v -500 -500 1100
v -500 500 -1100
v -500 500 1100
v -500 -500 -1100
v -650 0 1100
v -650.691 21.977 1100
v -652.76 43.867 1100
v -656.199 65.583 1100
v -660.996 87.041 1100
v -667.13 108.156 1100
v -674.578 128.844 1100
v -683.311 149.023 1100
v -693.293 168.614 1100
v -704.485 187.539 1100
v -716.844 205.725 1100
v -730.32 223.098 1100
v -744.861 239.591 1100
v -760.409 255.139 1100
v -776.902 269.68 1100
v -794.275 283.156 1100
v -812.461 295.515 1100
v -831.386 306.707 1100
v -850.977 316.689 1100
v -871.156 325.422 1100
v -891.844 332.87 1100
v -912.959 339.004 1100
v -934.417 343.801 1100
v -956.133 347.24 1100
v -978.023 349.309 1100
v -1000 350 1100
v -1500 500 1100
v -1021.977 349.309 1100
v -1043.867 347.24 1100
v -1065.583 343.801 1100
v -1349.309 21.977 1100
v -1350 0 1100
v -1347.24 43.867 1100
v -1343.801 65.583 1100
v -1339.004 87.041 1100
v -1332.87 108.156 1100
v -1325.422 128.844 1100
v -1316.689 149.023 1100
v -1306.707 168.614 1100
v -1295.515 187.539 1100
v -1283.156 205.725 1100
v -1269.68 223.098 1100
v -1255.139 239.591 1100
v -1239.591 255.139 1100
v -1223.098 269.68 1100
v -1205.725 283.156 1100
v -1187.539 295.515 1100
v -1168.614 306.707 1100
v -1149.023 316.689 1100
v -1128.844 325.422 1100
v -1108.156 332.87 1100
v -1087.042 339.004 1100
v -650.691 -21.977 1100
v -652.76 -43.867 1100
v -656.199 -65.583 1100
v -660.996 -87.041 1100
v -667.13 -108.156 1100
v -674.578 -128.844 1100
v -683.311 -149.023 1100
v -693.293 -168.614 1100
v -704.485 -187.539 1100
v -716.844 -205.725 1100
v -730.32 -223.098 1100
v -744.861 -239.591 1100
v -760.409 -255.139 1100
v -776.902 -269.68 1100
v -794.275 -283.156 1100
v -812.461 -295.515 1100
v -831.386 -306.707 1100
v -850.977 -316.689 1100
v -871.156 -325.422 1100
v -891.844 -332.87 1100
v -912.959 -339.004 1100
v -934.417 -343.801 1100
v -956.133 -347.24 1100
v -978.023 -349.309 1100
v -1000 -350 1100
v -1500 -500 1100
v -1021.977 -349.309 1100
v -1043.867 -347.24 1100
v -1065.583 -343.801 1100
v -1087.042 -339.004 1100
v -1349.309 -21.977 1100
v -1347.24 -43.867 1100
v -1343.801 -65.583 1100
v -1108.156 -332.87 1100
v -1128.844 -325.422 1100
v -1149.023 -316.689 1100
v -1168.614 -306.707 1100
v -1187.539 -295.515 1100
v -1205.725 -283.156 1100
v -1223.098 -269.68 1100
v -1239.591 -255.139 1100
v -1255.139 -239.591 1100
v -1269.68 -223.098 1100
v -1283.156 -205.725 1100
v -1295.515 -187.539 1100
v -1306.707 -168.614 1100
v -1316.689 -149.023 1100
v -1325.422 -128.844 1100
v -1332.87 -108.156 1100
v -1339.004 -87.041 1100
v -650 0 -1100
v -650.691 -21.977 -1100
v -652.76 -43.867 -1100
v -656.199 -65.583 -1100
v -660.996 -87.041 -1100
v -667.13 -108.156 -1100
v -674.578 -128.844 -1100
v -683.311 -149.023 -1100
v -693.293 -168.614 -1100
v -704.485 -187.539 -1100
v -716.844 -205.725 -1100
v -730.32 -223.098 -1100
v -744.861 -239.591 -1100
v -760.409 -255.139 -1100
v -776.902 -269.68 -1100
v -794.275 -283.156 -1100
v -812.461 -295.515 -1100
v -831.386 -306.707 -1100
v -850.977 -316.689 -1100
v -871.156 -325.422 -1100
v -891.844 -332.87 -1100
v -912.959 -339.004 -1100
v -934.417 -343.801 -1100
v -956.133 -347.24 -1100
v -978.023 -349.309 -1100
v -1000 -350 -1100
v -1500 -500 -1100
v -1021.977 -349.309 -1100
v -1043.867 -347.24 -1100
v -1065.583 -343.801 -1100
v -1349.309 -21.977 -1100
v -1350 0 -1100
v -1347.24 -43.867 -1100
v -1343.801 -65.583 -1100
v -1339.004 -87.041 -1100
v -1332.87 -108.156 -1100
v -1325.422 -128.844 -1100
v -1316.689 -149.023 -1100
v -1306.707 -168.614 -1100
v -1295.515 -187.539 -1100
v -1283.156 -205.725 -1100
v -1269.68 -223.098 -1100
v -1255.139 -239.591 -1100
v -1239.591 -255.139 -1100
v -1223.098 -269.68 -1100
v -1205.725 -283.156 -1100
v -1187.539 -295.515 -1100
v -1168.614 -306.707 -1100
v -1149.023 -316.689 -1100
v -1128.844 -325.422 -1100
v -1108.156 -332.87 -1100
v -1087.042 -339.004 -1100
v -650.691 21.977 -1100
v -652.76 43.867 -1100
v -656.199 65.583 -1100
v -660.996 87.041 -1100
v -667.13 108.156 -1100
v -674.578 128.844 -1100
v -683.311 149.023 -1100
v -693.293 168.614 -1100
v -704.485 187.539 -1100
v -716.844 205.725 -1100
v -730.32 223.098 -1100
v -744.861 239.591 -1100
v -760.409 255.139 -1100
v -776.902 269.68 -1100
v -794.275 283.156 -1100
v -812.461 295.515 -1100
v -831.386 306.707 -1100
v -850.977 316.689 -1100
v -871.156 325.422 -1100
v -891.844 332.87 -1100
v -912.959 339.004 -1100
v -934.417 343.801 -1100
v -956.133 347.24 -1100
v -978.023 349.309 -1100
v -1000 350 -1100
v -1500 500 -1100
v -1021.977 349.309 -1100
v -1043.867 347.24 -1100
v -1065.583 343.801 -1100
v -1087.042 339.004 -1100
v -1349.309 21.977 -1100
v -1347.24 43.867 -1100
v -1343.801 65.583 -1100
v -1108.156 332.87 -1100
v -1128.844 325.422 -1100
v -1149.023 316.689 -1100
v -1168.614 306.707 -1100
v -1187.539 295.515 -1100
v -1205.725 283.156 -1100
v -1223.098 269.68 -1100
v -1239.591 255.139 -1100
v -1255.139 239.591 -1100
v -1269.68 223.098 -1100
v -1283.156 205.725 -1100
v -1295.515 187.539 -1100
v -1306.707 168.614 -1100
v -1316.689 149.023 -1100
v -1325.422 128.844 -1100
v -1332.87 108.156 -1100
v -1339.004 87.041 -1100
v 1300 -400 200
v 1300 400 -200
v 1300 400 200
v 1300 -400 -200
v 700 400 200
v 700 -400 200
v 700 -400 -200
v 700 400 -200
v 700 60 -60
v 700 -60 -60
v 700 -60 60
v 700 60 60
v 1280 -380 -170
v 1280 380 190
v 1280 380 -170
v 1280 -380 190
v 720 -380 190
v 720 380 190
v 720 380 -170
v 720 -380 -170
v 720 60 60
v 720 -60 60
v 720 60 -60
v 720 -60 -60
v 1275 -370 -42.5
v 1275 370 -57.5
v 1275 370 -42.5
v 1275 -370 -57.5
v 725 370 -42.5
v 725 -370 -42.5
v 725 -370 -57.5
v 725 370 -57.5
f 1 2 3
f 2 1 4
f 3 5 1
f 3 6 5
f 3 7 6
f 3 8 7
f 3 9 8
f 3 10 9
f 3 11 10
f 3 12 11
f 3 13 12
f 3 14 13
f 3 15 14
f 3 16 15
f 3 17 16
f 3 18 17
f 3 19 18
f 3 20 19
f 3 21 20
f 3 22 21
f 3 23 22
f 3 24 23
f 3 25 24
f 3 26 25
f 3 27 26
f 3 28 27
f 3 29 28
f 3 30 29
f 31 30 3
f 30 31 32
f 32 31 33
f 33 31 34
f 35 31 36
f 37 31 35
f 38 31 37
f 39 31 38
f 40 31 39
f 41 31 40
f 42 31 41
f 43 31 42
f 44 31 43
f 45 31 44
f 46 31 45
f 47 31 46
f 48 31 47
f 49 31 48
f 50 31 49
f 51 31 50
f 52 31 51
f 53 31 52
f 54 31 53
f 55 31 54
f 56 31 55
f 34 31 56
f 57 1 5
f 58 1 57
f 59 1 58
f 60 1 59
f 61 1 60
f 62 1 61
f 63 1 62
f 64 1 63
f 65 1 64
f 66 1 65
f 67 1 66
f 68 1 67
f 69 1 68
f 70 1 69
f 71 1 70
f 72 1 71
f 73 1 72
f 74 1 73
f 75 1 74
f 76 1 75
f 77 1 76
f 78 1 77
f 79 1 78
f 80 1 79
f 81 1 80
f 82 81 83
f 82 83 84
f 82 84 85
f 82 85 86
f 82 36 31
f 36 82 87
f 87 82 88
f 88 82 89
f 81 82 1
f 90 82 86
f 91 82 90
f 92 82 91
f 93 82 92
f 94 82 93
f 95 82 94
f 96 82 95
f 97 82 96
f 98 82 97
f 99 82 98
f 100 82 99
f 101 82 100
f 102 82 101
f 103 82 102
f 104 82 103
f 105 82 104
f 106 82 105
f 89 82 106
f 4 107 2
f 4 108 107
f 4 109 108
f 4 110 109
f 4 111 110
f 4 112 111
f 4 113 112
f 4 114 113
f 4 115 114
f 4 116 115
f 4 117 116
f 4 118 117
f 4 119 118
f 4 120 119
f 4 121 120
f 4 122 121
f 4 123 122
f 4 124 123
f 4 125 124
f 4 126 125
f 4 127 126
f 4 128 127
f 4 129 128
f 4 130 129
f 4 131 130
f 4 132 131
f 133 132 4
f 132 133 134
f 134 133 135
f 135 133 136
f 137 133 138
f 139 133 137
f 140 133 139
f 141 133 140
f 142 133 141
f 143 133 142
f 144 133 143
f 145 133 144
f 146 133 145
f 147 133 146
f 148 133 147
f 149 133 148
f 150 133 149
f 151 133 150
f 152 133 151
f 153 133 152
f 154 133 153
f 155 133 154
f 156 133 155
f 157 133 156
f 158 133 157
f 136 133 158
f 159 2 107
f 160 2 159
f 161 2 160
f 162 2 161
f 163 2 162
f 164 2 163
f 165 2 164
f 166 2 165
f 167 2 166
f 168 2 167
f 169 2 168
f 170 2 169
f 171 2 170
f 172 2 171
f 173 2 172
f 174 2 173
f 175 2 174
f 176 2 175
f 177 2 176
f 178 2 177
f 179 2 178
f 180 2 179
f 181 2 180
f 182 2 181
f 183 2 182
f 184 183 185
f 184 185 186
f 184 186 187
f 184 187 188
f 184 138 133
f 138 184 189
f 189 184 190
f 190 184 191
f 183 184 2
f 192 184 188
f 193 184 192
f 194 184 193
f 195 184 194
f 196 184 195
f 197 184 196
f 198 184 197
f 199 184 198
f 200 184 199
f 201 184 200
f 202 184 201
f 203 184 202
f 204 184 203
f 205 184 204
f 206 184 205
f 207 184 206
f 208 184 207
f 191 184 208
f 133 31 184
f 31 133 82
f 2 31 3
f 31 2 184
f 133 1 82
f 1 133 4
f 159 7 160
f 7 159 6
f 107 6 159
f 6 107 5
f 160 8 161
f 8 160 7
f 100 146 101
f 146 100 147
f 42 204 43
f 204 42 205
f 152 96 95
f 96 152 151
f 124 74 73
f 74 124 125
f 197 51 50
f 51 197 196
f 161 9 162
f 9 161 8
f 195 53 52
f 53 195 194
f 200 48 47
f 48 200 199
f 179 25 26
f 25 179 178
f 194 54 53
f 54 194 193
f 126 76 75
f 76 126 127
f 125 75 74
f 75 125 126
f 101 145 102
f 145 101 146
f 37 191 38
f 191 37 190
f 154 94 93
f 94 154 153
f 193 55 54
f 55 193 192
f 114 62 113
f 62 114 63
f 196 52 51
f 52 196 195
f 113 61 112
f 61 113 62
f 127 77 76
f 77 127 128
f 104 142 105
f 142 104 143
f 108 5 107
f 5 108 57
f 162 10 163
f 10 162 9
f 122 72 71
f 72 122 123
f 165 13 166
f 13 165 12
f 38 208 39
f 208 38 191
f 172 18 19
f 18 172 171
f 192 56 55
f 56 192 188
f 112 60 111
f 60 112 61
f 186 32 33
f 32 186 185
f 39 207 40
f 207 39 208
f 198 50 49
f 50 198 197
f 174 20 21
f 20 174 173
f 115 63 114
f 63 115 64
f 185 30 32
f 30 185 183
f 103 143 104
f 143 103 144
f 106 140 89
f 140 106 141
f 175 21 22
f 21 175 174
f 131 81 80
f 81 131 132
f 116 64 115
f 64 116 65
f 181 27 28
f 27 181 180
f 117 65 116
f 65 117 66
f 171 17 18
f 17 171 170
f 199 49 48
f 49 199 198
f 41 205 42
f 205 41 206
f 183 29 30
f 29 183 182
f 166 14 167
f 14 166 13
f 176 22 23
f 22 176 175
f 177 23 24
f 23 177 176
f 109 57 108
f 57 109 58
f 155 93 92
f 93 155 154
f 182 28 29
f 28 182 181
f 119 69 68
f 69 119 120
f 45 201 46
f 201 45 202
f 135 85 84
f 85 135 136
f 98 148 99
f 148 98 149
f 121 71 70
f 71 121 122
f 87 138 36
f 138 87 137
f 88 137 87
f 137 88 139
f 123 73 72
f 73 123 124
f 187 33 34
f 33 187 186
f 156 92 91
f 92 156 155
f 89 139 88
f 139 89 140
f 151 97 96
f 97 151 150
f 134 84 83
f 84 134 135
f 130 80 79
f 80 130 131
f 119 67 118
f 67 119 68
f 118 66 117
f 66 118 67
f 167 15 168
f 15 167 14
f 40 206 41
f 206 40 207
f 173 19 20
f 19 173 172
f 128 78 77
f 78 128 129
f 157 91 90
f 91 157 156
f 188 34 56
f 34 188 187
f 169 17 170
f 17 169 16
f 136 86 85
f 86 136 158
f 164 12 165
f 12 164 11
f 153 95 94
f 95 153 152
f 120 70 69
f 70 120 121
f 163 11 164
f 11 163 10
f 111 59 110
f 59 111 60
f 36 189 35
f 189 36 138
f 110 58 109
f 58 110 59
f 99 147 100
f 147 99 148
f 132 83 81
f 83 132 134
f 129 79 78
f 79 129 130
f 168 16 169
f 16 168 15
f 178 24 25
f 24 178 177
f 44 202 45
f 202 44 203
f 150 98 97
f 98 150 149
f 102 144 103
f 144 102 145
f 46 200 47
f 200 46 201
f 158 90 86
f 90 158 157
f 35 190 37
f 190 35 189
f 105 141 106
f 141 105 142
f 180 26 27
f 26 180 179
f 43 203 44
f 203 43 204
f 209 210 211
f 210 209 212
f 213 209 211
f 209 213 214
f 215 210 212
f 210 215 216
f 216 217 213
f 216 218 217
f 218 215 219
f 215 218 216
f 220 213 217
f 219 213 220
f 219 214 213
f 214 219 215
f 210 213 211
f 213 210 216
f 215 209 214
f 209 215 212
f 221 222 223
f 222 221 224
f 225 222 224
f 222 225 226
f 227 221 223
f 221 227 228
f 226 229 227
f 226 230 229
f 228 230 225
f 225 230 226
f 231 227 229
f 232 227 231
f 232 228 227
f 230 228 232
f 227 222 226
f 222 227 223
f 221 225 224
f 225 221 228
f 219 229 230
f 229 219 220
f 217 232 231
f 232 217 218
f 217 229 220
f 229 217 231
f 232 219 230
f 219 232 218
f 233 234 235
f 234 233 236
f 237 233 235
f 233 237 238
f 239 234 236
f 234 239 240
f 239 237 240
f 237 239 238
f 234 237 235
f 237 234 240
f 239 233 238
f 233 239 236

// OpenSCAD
// =========================================================================
// ENTERPRISE ARCHITECTURE INTEGRATION STANDARD - SPECIFICATION FILE: medical_blueprints.scad
// LICENSE: Boost Software License (BSL-1.0)
// =========================================================================

$fn = 100;

// --- Actuator Pocket Anchor Geometry ---
module Hydraulic_Lifting_Pocket(bore=700, stroke=1800) {
    difference() {
        cube([1000, 1000, stroke + 400], center=true);
        // Main cylinder core clearance
        cylinder(h=stroke + 410, r=bore/2, center=true);
        // Lower passageway for 450mm titanium rod
        translate([0,0,-200])
            cylinder(h=stroke, r=450/2, center=true);
    }
}

// --- Medical Peltier Storage Box & Cooling Shelf Trays ---
module Medical_Cooling_Shelf(width=600, depth=800, height=400) {
    difference() {
        // Outer Insulated Composite Structure
        cube([width, depth, height], center=true);
        // Internal Storage Volume Vault
        translate([0, 0, 10])
            cube([width - 40, depth - 40, height - 40], center=true);
        // Left Wall Cutout: Solid-State Peltier Module Interface Port
        translate([-(width/2), 0, 0])
            cube([50, 120, 120], center=true);
    }
    // Slide-Out Aluminum Storage Tray Inserts
    translate([0, 0, -50])
        cube([width - 50, depth - 60, 15], center=true);
}

// Instantiate side-by-side array for engineering review
translate([-1000, 0, 0]) Hydraulic_Lifting_Pocket();
translate([1000, 0, 0])  Medical_Cooling_Shelf();
